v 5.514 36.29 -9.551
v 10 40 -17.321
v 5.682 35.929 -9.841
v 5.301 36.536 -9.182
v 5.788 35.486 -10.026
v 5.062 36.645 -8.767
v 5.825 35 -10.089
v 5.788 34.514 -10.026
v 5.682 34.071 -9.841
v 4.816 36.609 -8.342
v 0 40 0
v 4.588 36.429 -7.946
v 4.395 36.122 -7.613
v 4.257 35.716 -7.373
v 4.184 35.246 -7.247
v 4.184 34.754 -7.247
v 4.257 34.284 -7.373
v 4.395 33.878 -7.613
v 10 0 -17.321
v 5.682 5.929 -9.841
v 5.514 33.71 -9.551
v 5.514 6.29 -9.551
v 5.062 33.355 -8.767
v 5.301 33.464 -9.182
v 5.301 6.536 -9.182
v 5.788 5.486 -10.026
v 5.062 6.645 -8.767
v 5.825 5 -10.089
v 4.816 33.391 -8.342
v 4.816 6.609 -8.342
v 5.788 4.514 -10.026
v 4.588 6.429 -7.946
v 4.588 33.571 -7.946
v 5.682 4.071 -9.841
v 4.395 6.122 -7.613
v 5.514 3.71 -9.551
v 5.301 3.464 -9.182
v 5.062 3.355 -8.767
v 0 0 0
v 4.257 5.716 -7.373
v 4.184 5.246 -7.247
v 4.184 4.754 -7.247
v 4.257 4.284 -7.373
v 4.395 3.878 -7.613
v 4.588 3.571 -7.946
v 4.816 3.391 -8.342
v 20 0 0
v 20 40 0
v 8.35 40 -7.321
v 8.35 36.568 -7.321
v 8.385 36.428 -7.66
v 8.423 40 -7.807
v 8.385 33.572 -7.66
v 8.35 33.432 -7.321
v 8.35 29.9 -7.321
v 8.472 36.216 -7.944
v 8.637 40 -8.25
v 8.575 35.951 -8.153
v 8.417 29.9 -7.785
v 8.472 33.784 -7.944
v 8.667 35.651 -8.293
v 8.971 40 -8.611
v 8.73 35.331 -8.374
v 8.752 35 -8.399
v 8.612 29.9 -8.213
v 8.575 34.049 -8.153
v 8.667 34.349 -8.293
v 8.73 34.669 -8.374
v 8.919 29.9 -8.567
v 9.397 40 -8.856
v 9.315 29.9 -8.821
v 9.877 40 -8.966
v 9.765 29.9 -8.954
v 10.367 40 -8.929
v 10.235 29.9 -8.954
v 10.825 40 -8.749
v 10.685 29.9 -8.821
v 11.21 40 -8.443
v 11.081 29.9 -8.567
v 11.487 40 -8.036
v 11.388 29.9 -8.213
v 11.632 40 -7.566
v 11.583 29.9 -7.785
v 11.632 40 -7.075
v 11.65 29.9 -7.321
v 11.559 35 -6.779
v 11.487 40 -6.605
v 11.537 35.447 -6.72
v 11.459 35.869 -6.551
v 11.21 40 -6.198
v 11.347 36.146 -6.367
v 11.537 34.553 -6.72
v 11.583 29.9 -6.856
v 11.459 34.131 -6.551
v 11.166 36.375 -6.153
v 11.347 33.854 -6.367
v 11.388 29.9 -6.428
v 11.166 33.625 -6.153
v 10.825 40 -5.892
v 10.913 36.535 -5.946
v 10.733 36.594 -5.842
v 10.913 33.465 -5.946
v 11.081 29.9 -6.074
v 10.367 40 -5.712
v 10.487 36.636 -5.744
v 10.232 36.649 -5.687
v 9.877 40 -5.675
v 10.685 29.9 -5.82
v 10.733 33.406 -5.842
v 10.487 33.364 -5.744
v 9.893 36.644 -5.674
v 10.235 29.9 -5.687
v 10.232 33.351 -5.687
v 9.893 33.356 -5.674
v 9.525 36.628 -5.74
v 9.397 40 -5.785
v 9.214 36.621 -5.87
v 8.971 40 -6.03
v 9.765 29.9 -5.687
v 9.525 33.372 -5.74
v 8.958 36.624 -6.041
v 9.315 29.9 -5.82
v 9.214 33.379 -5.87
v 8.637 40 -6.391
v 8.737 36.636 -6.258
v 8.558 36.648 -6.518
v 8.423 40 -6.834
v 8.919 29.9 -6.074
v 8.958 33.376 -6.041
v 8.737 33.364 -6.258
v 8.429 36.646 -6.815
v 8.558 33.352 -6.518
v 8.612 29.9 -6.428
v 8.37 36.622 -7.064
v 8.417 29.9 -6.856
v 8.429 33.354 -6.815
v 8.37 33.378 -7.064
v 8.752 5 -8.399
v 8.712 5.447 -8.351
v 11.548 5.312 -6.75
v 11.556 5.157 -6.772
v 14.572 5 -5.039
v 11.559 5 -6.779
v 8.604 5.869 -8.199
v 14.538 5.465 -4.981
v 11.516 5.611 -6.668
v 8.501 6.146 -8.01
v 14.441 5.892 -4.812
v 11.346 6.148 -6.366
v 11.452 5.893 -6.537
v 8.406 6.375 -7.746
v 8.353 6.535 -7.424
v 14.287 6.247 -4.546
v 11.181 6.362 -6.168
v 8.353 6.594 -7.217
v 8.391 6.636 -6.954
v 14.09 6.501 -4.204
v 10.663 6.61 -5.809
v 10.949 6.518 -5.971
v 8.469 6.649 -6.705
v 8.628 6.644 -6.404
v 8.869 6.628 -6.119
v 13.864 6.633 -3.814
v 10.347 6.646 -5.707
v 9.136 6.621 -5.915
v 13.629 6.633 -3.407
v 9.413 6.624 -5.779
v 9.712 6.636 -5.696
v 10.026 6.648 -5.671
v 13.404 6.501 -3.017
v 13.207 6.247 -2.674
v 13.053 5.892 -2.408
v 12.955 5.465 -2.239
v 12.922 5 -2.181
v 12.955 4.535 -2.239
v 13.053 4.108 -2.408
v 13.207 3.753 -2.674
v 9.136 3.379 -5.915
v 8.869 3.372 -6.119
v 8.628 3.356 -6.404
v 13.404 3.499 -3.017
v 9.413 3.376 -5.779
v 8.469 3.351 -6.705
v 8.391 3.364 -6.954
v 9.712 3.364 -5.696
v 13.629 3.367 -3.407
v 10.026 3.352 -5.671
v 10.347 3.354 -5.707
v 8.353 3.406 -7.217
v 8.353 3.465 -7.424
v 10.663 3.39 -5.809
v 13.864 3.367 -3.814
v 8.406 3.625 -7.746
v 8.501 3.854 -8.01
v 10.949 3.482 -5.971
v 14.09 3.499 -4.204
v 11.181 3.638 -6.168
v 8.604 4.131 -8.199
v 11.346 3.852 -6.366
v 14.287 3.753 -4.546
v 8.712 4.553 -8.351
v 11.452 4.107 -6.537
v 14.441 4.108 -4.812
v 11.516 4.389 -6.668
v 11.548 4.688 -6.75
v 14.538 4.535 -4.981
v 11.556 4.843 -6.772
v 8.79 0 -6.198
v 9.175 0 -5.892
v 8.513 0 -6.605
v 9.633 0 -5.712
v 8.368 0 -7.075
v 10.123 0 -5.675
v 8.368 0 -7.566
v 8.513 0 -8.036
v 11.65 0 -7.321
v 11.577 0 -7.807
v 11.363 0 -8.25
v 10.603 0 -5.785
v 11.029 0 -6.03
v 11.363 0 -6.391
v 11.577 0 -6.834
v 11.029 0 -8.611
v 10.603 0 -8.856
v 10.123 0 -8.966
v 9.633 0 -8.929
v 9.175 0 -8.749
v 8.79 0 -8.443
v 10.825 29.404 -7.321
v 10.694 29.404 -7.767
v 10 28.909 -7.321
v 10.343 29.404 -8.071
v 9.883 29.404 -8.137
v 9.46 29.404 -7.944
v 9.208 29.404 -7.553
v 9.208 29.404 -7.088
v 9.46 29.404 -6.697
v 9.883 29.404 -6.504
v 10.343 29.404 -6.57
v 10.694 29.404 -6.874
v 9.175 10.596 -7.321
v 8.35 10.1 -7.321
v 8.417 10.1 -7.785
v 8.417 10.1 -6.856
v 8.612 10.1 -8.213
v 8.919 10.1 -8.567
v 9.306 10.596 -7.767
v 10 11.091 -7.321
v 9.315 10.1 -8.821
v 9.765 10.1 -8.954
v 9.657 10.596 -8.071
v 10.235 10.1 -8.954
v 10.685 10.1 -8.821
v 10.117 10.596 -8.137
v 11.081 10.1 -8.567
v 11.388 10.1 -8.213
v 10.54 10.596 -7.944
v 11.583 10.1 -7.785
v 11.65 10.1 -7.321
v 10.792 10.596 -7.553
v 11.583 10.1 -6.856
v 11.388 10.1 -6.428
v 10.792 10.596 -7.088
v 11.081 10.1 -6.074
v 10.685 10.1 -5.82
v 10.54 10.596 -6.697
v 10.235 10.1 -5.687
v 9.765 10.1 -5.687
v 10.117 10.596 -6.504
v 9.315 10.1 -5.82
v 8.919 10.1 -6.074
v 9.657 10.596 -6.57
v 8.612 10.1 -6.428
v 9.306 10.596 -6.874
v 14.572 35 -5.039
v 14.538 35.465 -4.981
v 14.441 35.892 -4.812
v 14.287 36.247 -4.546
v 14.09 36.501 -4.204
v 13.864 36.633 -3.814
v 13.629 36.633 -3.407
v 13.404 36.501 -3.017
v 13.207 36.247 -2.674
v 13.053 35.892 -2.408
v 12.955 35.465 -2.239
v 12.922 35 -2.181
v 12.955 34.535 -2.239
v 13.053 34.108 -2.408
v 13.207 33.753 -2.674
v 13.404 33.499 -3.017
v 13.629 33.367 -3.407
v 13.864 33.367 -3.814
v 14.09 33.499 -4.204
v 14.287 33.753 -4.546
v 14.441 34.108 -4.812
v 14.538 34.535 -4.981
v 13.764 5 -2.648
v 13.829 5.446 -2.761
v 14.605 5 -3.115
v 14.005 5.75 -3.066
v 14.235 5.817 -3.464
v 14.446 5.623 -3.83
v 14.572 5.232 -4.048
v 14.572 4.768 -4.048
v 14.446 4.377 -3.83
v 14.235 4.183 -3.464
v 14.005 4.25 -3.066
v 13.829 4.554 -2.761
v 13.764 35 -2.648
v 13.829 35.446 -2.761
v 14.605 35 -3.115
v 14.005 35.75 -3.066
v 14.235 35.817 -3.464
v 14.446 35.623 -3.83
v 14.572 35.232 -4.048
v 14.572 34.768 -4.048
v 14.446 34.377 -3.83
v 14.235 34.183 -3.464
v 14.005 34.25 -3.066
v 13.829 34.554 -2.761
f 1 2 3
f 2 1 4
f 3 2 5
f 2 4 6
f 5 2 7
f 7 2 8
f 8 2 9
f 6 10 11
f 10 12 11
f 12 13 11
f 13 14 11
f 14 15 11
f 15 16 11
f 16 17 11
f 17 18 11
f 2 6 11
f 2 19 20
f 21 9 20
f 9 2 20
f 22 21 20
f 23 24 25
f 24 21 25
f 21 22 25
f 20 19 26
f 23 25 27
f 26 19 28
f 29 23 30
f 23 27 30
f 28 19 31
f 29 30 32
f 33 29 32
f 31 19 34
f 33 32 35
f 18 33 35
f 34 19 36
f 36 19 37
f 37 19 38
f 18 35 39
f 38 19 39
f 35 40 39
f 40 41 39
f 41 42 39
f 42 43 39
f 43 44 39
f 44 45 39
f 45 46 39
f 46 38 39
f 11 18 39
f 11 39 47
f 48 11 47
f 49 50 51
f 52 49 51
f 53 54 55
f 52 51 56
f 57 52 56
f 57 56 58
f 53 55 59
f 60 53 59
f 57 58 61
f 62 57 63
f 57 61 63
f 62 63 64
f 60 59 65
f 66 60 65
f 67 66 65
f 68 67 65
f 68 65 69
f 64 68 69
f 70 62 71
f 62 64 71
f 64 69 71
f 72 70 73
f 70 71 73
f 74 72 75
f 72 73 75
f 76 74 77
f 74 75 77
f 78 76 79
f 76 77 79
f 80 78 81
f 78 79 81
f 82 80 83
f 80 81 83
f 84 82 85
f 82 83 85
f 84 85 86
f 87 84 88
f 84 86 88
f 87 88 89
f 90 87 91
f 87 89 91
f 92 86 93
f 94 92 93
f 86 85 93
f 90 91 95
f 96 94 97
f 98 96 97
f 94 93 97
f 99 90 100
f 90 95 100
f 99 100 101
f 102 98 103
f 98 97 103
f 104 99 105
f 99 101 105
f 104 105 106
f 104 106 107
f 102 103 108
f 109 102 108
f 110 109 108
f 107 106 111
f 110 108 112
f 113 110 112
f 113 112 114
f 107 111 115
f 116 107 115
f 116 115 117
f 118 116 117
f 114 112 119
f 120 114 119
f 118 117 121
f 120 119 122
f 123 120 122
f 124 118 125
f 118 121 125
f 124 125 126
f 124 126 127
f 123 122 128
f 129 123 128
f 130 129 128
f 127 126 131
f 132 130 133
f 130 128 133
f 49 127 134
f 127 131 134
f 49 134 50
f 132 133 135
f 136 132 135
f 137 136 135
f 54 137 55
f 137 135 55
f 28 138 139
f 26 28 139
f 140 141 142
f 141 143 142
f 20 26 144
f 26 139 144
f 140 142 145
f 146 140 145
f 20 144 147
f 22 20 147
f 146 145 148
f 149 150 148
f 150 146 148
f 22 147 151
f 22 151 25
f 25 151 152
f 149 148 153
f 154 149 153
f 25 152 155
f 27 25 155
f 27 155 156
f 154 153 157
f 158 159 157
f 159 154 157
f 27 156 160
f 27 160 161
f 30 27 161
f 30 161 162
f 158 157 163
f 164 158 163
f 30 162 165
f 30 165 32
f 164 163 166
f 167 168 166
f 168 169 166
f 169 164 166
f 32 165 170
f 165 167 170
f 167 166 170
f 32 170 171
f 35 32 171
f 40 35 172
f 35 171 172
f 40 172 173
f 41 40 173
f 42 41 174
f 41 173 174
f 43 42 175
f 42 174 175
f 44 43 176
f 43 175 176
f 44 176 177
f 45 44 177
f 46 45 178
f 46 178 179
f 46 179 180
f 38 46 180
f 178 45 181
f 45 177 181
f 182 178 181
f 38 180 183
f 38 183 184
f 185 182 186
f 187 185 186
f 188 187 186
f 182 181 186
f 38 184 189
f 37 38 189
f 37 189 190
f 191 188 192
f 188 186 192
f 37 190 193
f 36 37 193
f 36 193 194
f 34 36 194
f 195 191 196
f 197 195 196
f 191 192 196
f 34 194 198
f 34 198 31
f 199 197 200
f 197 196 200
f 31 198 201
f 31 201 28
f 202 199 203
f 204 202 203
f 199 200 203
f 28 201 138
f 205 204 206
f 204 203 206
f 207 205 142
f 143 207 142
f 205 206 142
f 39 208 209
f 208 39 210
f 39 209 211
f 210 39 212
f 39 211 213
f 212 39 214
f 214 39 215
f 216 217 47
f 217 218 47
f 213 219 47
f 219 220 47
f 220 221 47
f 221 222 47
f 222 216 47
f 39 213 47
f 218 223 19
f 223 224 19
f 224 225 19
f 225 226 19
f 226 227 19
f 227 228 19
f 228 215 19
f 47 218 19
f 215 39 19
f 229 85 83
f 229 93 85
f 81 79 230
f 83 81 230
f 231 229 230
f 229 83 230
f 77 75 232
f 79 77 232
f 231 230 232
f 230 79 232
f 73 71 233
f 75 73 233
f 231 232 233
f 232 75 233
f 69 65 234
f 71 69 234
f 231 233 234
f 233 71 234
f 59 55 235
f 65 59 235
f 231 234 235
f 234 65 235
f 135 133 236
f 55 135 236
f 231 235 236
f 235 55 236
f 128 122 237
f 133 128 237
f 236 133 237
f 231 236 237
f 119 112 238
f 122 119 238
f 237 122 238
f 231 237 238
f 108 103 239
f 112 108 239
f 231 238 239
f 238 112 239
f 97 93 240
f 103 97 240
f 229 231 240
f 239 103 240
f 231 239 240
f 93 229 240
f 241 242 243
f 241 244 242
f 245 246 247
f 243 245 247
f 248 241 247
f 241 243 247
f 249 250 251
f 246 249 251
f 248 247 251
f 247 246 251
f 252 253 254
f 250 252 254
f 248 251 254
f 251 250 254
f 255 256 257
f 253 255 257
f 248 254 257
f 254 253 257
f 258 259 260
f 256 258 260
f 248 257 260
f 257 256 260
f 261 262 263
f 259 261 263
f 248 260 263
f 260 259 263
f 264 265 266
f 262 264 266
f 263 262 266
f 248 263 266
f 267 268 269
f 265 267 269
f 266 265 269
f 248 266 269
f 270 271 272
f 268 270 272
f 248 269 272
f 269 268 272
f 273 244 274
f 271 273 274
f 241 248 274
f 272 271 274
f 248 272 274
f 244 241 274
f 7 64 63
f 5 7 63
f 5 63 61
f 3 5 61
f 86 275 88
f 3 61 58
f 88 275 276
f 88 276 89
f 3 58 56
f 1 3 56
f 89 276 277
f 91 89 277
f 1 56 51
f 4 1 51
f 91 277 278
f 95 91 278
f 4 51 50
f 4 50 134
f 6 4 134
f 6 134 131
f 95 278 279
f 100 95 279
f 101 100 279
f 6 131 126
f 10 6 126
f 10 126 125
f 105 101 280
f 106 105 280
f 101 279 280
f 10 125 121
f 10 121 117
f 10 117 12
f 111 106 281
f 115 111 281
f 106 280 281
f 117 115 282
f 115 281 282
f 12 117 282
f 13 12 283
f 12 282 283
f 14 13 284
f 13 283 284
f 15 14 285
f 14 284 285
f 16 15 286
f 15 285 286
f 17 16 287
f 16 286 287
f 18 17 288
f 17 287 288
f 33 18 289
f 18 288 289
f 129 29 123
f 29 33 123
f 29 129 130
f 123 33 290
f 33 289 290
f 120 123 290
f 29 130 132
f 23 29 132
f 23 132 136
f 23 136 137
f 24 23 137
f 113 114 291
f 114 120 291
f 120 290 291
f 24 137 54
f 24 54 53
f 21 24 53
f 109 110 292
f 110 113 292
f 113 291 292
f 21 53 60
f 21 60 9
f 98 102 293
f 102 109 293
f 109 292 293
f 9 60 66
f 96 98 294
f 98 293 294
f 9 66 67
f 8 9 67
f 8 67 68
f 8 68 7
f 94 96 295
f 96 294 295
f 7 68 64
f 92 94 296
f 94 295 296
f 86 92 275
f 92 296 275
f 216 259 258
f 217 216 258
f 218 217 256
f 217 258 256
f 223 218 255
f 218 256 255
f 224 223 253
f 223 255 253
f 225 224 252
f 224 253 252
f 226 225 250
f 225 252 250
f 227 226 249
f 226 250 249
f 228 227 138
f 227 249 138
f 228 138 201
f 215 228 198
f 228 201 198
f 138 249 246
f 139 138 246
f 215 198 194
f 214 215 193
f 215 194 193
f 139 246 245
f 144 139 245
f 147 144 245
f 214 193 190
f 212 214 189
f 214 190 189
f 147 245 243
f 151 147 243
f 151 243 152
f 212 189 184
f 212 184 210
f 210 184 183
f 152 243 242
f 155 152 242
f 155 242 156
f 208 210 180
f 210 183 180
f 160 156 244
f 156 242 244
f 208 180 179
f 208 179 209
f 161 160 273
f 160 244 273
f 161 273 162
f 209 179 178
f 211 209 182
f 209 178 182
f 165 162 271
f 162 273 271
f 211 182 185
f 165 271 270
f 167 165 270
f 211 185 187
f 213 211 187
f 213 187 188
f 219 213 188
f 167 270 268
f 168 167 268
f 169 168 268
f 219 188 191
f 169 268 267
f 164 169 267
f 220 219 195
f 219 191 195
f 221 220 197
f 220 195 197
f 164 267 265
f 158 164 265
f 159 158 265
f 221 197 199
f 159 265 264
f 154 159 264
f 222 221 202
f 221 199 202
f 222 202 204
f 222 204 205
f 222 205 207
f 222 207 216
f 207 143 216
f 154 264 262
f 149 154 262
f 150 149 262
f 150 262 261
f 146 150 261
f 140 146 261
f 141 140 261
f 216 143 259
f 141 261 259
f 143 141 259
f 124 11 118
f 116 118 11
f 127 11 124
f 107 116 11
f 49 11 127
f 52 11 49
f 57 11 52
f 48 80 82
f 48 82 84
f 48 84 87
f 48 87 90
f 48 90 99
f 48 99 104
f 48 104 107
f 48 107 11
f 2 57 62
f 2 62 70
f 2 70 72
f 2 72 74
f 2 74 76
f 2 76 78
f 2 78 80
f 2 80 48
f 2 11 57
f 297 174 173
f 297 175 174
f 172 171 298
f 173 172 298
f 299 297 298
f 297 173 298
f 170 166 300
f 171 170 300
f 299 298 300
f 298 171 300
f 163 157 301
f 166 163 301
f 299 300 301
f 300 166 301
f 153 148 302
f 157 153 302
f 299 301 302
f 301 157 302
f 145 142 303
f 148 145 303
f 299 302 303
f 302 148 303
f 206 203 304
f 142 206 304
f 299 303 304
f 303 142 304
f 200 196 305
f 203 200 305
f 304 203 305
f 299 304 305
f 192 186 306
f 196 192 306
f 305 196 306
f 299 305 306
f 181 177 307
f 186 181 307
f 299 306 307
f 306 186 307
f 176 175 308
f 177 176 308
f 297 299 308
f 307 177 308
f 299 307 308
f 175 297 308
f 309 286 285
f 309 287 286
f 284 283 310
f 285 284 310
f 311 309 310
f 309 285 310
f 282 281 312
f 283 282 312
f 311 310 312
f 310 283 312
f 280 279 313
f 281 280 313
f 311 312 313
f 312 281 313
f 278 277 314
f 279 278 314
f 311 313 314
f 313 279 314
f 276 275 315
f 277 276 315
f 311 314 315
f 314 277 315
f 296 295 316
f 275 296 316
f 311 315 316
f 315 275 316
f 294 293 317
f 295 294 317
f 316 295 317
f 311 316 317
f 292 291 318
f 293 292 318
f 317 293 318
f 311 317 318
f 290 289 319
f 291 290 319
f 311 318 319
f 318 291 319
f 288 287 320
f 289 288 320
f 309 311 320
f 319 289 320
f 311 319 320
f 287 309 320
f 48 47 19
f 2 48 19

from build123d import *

# Parameters (mm, degrees)
EXTRUDE_1_DEPTH        = 40
HOLE_WIZARD_M4_1_D     = 3.3
HOLE_WIZARD_M4_1_DEPTH = 10.1
HOLE_WIZARD_M4_1_TIP   = 0.991420021
HOLE_WIZARD_M4_2_D     = 3.3
HOLE_WIZARD_M4_2_DEPTH = 10.1
HOLE_WIZARD_M4_2_TIP   = 0.991420021
HOLE_WIZARD_M4_3_D     = 3.3
HOLE_WIZARD_M4_3_DEPTH = 10.1
HOLE_WIZARD_M4_3_TIP   = 0.991420021


with BuildPart() as part:
    # 草图1 → 凸台-拉伸1 (new body)
    with BuildSketch(Plane(origin=(0, 0, 0), x_dir=(1, 0, 0), z_dir=(0, 1, 0))):
        Polygon((0, 0), (20, 0), (10, 17.320508076), align=None)
    extrude(amount=EXTRUDE_1_DEPTH)

    # M4 螺纹孔1
    with Locations(Plane(origin=(0, 0, 0), x_dir=(-1, 0, 0), z_dir=(0, -1, 0))):
        with Locations((-10, 7.320508076)):
            Hole(HOLE_WIZARD_M4_1_D / 2, depth=HOLE_WIZARD_M4_1_DEPTH)
            with Locations((0, 0, -(HOLE_WIZARD_M4_1_DEPTH + HOLE_WIZARD_M4_1_TIP / 2))):  # 118° drill point
                Cone(0, HOLE_WIZARD_M4_1_D / 2, HOLE_WIZARD_M4_1_TIP, mode=Mode.SUBTRACT)

    # M4 螺纹孔2
    with Locations(Plane(origin=(0, 40, 0), x_dir=(1, 0, 0), z_dir=(0, 1, 0))):
        with Locations((10, 7.320508076)):
            Hole(HOLE_WIZARD_M4_2_D / 2, depth=HOLE_WIZARD_M4_2_DEPTH)
            with Locations((0, 0, -(HOLE_WIZARD_M4_2_DEPTH + HOLE_WIZARD_M4_2_TIP / 2))):  # 118° drill point
                Cone(0, HOLE_WIZARD_M4_2_D / 2, HOLE_WIZARD_M4_2_TIP, mode=Mode.SUBTRACT)

    # M4 螺纹孔3
    with Locations(Plane(origin=(0, 0, 0), x_dir=(-0.5, 0, 0.866025404), z_dir=(-0.866025404, 0, -0.5))):
        with Locations((-10, 35), (-10, 5)):
            Hole(HOLE_WIZARD_M4_3_D / 2, depth=HOLE_WIZARD_M4_3_DEPTH)
            with Locations((0, 0, -(HOLE_WIZARD_M4_3_DEPTH + HOLE_WIZARD_M4_3_TIP / 2))):  # 118° drill point
                Cone(0, HOLE_WIZARD_M4_3_D / 2, HOLE_WIZARD_M4_3_TIP, mode=Mode.SUBTRACT)


solid = part.part
